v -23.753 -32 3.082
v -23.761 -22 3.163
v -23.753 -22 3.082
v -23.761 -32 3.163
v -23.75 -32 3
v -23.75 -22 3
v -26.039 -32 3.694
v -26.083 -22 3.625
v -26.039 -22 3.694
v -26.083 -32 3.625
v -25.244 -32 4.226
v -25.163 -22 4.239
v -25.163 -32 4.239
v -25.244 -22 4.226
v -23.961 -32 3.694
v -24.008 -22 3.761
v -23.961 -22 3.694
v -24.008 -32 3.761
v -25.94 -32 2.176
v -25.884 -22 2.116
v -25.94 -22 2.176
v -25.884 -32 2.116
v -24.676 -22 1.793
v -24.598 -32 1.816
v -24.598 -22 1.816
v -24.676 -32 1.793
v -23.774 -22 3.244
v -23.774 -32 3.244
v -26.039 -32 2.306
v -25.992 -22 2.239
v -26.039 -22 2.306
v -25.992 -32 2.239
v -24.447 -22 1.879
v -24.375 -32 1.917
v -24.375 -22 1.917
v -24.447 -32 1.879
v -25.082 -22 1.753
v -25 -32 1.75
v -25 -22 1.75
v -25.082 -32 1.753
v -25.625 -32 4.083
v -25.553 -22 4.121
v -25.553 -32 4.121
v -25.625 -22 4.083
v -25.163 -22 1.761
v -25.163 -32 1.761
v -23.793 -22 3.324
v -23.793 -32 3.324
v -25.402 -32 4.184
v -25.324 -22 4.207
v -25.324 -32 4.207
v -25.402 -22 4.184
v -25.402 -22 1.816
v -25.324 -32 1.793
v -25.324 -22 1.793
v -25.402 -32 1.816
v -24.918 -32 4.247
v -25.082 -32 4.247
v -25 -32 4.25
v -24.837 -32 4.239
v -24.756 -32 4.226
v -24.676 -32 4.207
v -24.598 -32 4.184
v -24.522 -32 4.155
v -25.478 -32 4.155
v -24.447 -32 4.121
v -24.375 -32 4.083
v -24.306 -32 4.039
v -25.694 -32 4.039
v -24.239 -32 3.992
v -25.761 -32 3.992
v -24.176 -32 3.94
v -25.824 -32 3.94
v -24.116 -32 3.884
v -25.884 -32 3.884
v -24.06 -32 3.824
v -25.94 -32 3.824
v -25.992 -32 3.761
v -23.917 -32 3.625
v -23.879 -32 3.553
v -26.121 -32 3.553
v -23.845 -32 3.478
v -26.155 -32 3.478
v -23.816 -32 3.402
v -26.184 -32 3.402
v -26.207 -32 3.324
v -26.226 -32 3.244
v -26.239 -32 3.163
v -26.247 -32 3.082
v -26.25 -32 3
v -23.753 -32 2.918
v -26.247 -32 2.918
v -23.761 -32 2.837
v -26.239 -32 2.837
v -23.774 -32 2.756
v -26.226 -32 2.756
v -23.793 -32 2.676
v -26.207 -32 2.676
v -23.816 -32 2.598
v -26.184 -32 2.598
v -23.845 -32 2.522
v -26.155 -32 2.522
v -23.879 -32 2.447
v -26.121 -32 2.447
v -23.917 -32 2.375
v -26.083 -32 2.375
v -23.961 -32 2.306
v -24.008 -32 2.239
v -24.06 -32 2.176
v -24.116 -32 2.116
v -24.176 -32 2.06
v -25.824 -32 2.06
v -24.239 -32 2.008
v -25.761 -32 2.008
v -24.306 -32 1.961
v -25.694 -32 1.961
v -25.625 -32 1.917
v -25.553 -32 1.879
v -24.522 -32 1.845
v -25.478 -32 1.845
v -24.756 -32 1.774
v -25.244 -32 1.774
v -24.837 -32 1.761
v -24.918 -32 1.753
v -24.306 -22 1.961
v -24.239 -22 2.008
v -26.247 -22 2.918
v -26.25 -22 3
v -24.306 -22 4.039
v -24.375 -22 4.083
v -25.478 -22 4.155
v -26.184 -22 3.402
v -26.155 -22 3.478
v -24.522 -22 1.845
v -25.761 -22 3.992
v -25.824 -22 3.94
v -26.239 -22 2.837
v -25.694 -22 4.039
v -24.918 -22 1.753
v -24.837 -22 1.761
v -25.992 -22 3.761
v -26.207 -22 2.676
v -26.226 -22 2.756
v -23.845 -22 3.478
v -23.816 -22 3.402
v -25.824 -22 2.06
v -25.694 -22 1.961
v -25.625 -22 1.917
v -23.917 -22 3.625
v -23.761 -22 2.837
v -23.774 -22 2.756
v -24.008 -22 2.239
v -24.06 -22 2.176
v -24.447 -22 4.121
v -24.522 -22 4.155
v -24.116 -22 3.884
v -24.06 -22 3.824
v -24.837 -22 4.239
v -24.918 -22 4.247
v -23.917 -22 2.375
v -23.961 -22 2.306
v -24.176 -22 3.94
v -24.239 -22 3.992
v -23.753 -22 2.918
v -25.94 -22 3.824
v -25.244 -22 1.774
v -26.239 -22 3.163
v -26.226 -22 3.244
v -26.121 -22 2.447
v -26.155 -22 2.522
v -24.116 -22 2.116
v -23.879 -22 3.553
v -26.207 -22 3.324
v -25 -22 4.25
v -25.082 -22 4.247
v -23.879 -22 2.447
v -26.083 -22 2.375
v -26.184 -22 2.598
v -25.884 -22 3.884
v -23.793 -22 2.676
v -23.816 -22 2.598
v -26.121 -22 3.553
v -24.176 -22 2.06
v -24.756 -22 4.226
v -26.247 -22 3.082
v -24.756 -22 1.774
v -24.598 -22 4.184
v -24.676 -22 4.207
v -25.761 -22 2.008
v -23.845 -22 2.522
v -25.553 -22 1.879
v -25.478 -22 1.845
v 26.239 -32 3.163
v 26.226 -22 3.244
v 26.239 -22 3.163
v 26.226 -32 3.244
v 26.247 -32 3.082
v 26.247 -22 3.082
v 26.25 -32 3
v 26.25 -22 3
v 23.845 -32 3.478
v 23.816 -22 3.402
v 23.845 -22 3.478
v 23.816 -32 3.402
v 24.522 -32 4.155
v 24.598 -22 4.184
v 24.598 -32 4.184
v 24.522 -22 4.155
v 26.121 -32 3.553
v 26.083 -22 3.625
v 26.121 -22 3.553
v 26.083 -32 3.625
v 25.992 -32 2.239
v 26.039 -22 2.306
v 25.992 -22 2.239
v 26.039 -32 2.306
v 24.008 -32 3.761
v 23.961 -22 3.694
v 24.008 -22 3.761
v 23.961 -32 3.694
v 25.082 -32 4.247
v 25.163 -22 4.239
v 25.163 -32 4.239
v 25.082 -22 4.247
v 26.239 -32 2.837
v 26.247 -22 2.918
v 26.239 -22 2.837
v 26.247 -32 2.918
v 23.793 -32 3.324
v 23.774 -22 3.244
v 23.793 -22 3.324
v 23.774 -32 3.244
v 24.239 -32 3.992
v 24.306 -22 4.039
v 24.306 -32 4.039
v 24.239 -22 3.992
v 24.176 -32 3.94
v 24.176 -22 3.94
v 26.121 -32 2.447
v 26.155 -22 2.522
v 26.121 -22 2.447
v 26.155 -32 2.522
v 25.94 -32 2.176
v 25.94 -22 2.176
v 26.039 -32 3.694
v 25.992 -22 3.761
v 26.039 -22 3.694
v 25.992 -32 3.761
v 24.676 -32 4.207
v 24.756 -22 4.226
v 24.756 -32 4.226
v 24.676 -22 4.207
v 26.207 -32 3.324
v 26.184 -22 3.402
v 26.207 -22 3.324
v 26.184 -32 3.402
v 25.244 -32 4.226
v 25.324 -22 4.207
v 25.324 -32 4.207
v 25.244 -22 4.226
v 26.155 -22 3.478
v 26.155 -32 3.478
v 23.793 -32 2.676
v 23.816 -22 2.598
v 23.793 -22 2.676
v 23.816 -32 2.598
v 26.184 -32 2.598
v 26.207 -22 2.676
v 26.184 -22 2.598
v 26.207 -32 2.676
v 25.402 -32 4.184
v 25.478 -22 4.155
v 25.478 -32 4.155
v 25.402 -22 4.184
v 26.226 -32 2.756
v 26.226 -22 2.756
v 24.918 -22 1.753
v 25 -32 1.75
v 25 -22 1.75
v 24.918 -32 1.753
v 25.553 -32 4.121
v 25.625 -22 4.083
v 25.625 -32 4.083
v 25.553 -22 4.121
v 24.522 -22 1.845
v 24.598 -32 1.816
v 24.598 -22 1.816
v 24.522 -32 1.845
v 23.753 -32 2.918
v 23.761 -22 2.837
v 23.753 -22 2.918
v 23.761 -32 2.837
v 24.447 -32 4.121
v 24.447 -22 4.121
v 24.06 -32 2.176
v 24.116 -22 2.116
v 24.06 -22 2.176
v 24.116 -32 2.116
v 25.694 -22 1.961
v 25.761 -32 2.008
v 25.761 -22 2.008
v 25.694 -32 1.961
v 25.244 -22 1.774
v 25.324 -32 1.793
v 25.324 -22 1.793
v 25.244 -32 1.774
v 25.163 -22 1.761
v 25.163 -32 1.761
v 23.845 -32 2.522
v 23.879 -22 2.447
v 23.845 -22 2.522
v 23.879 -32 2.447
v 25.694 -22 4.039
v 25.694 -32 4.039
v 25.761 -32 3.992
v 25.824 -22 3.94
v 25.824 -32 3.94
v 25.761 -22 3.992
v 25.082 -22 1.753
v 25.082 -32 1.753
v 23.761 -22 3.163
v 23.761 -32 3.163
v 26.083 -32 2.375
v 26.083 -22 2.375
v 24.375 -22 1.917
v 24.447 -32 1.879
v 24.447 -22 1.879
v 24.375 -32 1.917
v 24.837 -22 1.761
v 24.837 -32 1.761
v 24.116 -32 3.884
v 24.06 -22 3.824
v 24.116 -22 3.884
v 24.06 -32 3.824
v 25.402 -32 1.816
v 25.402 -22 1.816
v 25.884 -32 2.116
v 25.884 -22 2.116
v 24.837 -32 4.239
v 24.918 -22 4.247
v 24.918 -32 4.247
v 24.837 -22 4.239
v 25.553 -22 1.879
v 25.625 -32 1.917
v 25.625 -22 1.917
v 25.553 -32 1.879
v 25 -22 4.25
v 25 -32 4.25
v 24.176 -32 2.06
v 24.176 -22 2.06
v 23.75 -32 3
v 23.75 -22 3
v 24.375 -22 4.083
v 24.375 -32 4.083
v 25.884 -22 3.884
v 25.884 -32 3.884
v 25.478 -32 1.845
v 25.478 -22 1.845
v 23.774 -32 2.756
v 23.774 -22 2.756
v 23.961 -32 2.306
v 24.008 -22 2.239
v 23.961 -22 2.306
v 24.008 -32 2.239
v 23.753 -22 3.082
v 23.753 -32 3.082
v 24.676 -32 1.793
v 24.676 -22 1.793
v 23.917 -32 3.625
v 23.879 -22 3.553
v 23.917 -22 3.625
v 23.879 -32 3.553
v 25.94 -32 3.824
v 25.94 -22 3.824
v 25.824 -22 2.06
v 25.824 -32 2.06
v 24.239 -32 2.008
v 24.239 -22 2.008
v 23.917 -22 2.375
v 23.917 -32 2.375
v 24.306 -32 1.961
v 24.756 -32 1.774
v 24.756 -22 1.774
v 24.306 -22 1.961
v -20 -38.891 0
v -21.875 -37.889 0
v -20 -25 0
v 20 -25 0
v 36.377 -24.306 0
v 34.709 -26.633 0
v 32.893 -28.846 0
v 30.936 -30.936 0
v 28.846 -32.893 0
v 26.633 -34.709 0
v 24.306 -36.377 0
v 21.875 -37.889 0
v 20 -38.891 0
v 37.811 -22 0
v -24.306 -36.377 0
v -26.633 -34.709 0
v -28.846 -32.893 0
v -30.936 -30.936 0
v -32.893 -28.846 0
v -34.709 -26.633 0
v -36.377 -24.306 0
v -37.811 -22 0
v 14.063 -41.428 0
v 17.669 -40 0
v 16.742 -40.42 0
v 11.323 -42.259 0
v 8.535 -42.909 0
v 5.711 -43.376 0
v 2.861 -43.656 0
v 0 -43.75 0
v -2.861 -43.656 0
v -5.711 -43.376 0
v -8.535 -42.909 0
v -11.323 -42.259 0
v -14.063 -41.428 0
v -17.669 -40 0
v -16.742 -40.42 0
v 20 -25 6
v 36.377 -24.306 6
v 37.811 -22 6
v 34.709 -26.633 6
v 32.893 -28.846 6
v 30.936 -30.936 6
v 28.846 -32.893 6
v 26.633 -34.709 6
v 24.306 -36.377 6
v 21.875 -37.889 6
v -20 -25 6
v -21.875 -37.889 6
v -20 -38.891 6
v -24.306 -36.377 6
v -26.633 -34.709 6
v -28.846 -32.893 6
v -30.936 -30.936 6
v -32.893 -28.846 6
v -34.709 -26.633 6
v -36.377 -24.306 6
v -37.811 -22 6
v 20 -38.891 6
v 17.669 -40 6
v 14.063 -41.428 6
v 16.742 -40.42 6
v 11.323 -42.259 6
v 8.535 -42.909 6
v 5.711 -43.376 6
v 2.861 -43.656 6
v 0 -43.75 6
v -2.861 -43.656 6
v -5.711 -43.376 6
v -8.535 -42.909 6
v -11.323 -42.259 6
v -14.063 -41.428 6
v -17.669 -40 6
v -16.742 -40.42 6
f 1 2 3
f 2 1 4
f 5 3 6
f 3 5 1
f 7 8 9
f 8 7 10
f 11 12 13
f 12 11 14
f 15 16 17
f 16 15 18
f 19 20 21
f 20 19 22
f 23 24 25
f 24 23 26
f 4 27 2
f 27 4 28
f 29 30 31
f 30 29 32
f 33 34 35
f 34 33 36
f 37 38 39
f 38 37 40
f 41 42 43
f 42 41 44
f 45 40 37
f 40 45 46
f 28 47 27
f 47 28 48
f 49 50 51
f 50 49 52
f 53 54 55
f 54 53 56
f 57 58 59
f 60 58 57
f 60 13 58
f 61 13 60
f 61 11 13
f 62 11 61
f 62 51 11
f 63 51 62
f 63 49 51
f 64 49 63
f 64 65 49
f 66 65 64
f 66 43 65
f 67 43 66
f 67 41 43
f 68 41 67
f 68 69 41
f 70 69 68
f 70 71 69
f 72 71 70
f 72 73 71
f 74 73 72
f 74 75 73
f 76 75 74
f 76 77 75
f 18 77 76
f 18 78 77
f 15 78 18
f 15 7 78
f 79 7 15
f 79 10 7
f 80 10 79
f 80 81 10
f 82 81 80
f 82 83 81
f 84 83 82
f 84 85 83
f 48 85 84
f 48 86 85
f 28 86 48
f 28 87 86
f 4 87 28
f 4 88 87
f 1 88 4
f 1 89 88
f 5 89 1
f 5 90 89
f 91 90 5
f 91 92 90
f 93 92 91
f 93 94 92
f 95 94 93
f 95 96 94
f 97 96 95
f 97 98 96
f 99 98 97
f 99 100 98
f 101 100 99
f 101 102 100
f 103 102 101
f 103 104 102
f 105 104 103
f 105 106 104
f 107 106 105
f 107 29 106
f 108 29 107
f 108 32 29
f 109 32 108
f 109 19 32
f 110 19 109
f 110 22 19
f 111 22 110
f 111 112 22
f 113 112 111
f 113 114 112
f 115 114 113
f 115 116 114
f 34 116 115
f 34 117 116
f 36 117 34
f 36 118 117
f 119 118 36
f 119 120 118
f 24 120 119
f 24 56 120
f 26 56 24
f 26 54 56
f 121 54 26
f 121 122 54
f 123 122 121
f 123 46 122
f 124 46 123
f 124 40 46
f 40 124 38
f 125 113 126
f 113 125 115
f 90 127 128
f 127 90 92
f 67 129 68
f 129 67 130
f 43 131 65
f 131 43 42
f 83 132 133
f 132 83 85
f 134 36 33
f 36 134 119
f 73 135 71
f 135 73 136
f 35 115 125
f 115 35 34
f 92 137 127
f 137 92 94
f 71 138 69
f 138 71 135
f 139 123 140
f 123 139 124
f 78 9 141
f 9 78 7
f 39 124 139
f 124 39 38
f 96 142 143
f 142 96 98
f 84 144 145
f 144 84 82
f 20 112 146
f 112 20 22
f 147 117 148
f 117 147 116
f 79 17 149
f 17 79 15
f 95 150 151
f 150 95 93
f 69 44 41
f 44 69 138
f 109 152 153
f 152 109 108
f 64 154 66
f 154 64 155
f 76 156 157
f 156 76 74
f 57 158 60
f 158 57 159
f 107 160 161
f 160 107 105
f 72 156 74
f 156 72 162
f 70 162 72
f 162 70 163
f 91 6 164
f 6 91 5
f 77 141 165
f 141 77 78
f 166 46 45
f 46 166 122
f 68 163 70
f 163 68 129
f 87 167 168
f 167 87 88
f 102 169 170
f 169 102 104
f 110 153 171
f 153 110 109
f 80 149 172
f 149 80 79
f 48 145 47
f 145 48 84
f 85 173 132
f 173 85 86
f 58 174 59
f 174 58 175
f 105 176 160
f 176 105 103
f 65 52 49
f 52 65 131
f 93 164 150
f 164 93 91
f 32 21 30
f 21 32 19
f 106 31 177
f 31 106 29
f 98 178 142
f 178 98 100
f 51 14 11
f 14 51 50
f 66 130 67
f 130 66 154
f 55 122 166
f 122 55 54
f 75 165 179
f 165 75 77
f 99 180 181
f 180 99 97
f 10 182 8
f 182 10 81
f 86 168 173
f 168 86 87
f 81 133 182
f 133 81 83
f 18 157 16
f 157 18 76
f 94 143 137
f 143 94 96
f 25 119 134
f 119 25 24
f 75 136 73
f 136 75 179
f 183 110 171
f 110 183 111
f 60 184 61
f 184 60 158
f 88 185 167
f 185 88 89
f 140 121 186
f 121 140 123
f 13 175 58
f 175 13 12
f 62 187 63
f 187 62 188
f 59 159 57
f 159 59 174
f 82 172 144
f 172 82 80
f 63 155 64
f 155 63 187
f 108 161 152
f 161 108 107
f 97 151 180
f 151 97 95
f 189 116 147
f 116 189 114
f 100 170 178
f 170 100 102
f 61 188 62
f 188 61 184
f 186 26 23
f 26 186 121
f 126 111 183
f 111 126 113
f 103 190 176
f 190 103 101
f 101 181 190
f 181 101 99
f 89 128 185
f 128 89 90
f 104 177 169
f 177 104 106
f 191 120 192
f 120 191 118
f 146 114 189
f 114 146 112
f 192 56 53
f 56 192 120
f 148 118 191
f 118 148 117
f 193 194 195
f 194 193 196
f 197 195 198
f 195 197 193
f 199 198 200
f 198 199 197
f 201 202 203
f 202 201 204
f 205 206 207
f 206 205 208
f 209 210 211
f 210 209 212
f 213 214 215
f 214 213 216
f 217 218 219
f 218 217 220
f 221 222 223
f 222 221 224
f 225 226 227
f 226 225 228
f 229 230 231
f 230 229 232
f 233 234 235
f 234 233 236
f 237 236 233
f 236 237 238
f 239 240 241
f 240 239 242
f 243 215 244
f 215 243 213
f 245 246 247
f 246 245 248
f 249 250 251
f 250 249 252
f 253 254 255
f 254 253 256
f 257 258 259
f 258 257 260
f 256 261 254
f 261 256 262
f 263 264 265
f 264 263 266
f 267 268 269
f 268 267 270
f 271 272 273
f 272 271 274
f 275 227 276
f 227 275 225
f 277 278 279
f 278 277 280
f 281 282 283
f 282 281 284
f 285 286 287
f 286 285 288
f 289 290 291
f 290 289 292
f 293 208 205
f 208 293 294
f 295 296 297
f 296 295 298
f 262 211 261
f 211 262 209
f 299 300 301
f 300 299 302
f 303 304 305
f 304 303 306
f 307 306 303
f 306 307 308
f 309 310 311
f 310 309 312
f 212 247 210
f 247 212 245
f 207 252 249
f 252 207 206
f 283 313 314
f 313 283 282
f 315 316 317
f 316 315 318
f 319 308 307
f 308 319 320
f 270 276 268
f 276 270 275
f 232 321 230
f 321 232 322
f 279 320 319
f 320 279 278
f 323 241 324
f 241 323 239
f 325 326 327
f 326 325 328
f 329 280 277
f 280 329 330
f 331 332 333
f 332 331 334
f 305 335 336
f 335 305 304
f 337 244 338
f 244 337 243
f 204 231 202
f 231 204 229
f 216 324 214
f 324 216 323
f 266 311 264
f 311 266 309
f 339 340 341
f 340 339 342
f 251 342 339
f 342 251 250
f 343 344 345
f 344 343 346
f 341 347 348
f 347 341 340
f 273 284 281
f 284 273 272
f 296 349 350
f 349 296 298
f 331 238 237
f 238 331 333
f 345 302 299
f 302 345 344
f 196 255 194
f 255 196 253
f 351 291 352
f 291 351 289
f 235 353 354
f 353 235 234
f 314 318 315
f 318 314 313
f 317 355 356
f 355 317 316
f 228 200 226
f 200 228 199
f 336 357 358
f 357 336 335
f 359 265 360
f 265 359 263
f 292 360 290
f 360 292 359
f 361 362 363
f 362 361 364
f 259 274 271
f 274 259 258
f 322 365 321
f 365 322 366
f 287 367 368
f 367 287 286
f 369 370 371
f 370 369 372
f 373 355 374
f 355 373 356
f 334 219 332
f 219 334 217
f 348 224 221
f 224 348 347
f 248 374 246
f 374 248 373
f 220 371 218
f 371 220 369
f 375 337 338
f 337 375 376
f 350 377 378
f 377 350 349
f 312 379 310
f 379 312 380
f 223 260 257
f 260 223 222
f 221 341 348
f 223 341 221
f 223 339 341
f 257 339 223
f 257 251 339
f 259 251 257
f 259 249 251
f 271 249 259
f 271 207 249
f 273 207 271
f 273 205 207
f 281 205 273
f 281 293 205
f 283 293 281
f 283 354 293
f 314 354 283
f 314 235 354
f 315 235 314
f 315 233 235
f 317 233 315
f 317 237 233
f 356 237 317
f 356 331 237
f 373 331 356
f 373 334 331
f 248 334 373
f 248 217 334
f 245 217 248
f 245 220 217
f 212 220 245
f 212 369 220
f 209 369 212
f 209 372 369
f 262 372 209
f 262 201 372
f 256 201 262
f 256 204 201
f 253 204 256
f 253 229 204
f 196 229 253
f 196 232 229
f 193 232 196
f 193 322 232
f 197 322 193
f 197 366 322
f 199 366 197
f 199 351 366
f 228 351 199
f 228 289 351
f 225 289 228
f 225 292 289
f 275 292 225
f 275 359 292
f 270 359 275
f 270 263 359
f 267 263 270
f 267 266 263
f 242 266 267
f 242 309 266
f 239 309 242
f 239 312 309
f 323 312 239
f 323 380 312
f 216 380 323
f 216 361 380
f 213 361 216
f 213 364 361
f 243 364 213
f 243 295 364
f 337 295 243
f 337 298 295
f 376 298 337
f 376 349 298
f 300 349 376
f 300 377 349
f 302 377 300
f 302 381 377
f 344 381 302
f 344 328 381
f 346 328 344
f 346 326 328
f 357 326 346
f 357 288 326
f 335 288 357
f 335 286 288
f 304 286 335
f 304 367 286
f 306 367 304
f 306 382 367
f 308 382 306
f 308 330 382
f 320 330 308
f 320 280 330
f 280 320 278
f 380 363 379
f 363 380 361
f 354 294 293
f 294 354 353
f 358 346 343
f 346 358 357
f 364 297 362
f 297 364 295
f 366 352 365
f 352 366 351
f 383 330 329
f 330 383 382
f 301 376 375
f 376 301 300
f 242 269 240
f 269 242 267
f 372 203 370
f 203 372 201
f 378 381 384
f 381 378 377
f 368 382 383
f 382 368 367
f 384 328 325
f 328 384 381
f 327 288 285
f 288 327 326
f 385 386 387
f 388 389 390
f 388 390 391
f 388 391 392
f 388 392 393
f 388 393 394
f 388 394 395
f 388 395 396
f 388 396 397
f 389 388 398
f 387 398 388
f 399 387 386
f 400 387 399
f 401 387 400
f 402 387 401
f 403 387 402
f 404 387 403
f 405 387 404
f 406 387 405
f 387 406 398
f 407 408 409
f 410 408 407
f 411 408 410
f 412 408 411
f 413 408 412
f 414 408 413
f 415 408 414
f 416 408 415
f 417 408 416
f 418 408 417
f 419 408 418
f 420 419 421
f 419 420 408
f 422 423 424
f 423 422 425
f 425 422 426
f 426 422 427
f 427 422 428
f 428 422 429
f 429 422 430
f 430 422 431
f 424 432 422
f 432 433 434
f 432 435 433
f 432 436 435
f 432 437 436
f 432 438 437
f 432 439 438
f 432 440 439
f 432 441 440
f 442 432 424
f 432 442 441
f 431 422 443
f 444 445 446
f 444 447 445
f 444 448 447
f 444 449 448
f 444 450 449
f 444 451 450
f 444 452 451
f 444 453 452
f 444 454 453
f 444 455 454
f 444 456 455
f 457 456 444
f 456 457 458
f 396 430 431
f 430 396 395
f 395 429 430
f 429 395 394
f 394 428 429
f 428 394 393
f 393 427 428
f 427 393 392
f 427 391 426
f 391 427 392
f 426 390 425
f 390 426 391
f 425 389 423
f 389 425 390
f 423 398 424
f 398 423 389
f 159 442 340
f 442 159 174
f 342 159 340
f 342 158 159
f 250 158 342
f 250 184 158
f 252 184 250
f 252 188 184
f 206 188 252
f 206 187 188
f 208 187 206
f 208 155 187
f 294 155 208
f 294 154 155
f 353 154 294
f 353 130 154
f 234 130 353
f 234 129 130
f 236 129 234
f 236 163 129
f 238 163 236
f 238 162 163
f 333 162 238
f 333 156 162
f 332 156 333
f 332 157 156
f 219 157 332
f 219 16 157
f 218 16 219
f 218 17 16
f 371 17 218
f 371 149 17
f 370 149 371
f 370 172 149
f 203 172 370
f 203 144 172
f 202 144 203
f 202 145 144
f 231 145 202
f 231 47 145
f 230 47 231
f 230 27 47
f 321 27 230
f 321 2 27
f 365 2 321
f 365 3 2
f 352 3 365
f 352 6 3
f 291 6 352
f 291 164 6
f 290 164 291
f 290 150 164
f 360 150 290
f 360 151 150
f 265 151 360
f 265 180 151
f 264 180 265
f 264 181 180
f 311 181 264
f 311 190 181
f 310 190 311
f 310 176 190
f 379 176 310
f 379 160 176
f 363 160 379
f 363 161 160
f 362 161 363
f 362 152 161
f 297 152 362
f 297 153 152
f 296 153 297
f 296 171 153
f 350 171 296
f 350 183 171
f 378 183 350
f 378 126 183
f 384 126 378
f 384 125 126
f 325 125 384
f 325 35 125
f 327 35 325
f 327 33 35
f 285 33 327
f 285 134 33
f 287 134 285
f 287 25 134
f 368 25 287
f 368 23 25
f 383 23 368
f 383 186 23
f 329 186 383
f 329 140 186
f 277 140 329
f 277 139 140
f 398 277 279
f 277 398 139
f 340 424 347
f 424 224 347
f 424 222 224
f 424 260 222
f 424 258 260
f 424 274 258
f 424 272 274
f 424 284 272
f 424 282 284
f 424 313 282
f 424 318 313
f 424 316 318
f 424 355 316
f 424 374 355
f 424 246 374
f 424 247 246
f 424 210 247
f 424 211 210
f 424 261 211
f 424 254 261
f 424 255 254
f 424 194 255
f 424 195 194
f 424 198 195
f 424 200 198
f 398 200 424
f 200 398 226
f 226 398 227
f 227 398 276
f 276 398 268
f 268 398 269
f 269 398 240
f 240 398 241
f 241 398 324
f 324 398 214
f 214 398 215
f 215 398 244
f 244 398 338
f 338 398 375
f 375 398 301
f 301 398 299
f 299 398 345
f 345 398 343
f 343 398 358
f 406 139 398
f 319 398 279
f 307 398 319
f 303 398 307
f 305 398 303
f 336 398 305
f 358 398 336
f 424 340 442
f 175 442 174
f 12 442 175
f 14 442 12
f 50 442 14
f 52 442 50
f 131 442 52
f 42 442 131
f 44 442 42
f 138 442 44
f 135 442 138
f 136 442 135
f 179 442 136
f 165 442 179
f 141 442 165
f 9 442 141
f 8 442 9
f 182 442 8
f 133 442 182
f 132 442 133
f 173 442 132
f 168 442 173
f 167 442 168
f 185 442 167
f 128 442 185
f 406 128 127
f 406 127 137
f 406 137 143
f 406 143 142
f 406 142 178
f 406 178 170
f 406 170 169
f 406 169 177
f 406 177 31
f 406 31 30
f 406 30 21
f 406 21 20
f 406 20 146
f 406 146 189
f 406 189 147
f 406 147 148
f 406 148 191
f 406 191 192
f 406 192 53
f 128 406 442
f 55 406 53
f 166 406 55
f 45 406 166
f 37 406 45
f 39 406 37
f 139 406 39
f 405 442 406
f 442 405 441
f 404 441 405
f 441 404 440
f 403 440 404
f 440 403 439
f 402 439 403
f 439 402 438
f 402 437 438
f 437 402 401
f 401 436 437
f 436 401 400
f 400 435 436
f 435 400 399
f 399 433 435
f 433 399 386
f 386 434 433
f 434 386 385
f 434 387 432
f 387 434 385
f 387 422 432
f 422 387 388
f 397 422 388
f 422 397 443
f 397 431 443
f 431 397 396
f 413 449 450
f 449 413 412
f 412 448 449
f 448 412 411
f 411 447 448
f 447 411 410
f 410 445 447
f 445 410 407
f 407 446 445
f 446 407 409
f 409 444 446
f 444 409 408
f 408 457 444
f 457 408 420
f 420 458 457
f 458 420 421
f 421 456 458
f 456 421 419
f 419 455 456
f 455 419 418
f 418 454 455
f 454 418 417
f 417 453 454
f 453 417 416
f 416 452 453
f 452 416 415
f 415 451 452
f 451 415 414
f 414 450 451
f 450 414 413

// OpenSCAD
// =====================================================================
// child_tray_rib.scad — 子機トレイ バルクヘッドリブ (3枚印刷)
// 半円板(Ø87.5 = フランジ開口88.5 − 1.0)。上端フラット面を
// child_tray_deck の下面に当て、デッキ上から M3×2 で固定する。
// 中央切欠きは配線通し兼軽量化。前リブはペネトレータ後方空間に
// 干渉しない位置(デッキ側 front_zone)に付くこと(要実測確認)。
// 印刷向き: 平置き(円板面を下)。M3下穴は層内水平だがØ2.5なので実用上OK。
// =====================================================================

/* [容器 (実測値)] */
flange_bore  = 88.5;   // フランジ貫通口 実測Ø
glide_clear  = 1.0;    // 開口との径クリアランス

/* [デッキとの関係 (child_tray_deck と一致させる)] */
deck_drop    = 18;     // 軸心→デッキ上面
deck_t       = 4;      // デッキ板厚
rib_t        = 6;      // リブ厚
screw_x      = 25;     // M3位置(±)  ※deck の rib_screw_x と一致
pilot_d      = 2.5;    // M3 セルフタップ下穴
pilot_depth  = 10;

/* [切欠き] */
cut_w        = 40;     // 配線切欠き幅
cut_h        = 14;     // 配線切欠き高さ

$fn = 96;

// ---- 導出 -----------------------------------------------------------
rib_r   = (flange_bore - glide_clear) / 2;   // 43.75
top_y   = -(deck_drop + deck_t);             // 上端フラット面 (軸心基準 -22)
cut_y0  = top_y - 4;                          // 切欠き上端(上端から4下げ)

// ---- 干渉チェック -----------------------------------------------------
assert(abs(screw_x) - pilot_d/2 > cut_w/2 + 2,
       "M3下穴が配線切欠きと干渉");
assert(cut_y0 - cut_h > -rib_r + 3,
       str("配線切欠き下端が外周に接近(残り",
           (cut_y0 - cut_h) - (-rib_r), "mm)"));
assert(sqrt(pow(screw_x,2) + pow(abs(top_y)+pilot_depth,2)) < rib_r - 1.5,
       "M3下穴の先端が外周を突き抜け");

// ---- 本体 (軸心=原点、y負側が下、板厚は+Z) ----------------------------
difference() {
    linear_extrude(height = rib_t)
        difference() {
            intersection() {
                circle(r = rib_r);
                translate([-rib_r, top_y - rib_r]) square([2*rib_r, rib_r]); // y<=top_y
            }
            // 配線切欠き
            translate([-cut_w/2, cut_y0 - cut_h]) square([cut_w, cut_h + 1]);
        }
    // M3 セルフタップ下穴 ×2 (上端フラット面から半径方向内向きに)
    for (sx=[-1,1])
        translate([sx*screw_x, top_y + 0.5, rib_t/2])
            rotate([90, 0, 0])
                cylinder(d = pilot_d, h = pilot_depth + 0.5);
}
